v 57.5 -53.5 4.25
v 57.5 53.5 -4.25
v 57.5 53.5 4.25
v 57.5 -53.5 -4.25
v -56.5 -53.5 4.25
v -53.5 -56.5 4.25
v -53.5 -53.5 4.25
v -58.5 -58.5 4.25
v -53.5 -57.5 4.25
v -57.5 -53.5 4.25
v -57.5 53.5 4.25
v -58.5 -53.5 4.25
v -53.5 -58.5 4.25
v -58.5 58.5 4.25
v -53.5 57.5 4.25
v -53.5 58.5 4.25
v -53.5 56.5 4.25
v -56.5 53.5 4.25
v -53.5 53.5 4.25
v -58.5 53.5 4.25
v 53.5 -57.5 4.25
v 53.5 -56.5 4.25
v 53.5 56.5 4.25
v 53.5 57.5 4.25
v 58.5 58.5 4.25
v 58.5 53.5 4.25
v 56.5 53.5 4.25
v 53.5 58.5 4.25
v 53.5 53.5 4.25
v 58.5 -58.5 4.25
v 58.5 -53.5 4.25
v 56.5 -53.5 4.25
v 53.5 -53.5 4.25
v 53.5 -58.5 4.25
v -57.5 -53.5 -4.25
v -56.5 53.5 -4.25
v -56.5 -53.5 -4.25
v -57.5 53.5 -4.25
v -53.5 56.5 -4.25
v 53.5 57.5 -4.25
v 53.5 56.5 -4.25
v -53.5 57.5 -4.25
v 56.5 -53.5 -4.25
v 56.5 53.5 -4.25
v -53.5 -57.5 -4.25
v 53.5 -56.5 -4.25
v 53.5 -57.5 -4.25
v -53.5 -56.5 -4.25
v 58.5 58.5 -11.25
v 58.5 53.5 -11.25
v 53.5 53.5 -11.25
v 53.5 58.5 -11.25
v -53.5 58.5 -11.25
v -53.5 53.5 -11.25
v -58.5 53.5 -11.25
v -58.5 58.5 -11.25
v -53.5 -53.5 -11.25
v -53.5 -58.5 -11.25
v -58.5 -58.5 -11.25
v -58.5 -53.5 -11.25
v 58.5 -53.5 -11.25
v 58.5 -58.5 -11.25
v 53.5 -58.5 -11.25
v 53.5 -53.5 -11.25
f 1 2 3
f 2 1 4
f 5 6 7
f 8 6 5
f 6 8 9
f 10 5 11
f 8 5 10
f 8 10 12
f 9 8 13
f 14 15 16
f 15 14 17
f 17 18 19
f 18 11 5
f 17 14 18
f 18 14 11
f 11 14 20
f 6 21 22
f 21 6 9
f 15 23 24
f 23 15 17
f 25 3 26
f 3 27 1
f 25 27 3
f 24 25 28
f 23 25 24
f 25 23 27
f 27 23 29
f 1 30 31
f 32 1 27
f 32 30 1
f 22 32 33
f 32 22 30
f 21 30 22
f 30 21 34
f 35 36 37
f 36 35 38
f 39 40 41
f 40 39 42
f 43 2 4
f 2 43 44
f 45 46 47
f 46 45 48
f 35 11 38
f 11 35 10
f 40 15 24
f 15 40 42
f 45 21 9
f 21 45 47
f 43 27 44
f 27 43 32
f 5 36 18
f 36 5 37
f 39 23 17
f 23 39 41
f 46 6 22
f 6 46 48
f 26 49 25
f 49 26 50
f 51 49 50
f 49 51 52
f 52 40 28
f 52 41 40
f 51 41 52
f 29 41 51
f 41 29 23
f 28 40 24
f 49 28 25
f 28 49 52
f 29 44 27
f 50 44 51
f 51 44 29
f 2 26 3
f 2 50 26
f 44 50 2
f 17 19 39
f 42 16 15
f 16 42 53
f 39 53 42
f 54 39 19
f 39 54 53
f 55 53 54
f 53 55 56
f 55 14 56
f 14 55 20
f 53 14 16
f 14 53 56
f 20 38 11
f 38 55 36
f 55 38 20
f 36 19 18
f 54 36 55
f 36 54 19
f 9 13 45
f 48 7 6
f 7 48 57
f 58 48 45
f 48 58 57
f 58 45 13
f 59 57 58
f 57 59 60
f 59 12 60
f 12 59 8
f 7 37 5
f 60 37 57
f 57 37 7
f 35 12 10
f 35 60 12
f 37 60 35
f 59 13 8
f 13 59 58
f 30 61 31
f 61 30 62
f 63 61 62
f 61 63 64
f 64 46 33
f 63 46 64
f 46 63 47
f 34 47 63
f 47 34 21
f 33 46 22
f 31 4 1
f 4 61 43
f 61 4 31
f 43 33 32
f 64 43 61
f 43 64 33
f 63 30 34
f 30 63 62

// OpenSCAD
stand_width=115;
stand_height=8;
stand_thickness=2;
leg_width=5;
leg_height=15;
leg_offset=1;



module stand(sw=stand_width,sh=stand_height,st=stand_thickness,lw=leg_width,lh=leg_height,lo=leg_offset) {
    
    module leg() {
        cube([lw,lw,0.5+lh],true);
    }
    
    union() {
        difference() {
            cube([sw,sw,0.5+sh],true);
            cube([sw-st,sw-st,sh+5],true);
        }
        translate([lo+(sw-lw)/2,lo+(sw-lw)/2,(lh-sh)/-2])
            leg();
        translate([-(lo+(sw-lw)/2),lo+(sw-lw)/2,(lh-sh)/-2])
            leg();
        translate([-(lo+(sw-lw)/2),-(lo+(sw-lw)/2),(lh-sh)/-2])
            leg();
        translate([lo+(sw-lw)/2,-(lo+(sw-lw)/2),(lh-sh)/-2])
            leg();
    }
}

stand();
